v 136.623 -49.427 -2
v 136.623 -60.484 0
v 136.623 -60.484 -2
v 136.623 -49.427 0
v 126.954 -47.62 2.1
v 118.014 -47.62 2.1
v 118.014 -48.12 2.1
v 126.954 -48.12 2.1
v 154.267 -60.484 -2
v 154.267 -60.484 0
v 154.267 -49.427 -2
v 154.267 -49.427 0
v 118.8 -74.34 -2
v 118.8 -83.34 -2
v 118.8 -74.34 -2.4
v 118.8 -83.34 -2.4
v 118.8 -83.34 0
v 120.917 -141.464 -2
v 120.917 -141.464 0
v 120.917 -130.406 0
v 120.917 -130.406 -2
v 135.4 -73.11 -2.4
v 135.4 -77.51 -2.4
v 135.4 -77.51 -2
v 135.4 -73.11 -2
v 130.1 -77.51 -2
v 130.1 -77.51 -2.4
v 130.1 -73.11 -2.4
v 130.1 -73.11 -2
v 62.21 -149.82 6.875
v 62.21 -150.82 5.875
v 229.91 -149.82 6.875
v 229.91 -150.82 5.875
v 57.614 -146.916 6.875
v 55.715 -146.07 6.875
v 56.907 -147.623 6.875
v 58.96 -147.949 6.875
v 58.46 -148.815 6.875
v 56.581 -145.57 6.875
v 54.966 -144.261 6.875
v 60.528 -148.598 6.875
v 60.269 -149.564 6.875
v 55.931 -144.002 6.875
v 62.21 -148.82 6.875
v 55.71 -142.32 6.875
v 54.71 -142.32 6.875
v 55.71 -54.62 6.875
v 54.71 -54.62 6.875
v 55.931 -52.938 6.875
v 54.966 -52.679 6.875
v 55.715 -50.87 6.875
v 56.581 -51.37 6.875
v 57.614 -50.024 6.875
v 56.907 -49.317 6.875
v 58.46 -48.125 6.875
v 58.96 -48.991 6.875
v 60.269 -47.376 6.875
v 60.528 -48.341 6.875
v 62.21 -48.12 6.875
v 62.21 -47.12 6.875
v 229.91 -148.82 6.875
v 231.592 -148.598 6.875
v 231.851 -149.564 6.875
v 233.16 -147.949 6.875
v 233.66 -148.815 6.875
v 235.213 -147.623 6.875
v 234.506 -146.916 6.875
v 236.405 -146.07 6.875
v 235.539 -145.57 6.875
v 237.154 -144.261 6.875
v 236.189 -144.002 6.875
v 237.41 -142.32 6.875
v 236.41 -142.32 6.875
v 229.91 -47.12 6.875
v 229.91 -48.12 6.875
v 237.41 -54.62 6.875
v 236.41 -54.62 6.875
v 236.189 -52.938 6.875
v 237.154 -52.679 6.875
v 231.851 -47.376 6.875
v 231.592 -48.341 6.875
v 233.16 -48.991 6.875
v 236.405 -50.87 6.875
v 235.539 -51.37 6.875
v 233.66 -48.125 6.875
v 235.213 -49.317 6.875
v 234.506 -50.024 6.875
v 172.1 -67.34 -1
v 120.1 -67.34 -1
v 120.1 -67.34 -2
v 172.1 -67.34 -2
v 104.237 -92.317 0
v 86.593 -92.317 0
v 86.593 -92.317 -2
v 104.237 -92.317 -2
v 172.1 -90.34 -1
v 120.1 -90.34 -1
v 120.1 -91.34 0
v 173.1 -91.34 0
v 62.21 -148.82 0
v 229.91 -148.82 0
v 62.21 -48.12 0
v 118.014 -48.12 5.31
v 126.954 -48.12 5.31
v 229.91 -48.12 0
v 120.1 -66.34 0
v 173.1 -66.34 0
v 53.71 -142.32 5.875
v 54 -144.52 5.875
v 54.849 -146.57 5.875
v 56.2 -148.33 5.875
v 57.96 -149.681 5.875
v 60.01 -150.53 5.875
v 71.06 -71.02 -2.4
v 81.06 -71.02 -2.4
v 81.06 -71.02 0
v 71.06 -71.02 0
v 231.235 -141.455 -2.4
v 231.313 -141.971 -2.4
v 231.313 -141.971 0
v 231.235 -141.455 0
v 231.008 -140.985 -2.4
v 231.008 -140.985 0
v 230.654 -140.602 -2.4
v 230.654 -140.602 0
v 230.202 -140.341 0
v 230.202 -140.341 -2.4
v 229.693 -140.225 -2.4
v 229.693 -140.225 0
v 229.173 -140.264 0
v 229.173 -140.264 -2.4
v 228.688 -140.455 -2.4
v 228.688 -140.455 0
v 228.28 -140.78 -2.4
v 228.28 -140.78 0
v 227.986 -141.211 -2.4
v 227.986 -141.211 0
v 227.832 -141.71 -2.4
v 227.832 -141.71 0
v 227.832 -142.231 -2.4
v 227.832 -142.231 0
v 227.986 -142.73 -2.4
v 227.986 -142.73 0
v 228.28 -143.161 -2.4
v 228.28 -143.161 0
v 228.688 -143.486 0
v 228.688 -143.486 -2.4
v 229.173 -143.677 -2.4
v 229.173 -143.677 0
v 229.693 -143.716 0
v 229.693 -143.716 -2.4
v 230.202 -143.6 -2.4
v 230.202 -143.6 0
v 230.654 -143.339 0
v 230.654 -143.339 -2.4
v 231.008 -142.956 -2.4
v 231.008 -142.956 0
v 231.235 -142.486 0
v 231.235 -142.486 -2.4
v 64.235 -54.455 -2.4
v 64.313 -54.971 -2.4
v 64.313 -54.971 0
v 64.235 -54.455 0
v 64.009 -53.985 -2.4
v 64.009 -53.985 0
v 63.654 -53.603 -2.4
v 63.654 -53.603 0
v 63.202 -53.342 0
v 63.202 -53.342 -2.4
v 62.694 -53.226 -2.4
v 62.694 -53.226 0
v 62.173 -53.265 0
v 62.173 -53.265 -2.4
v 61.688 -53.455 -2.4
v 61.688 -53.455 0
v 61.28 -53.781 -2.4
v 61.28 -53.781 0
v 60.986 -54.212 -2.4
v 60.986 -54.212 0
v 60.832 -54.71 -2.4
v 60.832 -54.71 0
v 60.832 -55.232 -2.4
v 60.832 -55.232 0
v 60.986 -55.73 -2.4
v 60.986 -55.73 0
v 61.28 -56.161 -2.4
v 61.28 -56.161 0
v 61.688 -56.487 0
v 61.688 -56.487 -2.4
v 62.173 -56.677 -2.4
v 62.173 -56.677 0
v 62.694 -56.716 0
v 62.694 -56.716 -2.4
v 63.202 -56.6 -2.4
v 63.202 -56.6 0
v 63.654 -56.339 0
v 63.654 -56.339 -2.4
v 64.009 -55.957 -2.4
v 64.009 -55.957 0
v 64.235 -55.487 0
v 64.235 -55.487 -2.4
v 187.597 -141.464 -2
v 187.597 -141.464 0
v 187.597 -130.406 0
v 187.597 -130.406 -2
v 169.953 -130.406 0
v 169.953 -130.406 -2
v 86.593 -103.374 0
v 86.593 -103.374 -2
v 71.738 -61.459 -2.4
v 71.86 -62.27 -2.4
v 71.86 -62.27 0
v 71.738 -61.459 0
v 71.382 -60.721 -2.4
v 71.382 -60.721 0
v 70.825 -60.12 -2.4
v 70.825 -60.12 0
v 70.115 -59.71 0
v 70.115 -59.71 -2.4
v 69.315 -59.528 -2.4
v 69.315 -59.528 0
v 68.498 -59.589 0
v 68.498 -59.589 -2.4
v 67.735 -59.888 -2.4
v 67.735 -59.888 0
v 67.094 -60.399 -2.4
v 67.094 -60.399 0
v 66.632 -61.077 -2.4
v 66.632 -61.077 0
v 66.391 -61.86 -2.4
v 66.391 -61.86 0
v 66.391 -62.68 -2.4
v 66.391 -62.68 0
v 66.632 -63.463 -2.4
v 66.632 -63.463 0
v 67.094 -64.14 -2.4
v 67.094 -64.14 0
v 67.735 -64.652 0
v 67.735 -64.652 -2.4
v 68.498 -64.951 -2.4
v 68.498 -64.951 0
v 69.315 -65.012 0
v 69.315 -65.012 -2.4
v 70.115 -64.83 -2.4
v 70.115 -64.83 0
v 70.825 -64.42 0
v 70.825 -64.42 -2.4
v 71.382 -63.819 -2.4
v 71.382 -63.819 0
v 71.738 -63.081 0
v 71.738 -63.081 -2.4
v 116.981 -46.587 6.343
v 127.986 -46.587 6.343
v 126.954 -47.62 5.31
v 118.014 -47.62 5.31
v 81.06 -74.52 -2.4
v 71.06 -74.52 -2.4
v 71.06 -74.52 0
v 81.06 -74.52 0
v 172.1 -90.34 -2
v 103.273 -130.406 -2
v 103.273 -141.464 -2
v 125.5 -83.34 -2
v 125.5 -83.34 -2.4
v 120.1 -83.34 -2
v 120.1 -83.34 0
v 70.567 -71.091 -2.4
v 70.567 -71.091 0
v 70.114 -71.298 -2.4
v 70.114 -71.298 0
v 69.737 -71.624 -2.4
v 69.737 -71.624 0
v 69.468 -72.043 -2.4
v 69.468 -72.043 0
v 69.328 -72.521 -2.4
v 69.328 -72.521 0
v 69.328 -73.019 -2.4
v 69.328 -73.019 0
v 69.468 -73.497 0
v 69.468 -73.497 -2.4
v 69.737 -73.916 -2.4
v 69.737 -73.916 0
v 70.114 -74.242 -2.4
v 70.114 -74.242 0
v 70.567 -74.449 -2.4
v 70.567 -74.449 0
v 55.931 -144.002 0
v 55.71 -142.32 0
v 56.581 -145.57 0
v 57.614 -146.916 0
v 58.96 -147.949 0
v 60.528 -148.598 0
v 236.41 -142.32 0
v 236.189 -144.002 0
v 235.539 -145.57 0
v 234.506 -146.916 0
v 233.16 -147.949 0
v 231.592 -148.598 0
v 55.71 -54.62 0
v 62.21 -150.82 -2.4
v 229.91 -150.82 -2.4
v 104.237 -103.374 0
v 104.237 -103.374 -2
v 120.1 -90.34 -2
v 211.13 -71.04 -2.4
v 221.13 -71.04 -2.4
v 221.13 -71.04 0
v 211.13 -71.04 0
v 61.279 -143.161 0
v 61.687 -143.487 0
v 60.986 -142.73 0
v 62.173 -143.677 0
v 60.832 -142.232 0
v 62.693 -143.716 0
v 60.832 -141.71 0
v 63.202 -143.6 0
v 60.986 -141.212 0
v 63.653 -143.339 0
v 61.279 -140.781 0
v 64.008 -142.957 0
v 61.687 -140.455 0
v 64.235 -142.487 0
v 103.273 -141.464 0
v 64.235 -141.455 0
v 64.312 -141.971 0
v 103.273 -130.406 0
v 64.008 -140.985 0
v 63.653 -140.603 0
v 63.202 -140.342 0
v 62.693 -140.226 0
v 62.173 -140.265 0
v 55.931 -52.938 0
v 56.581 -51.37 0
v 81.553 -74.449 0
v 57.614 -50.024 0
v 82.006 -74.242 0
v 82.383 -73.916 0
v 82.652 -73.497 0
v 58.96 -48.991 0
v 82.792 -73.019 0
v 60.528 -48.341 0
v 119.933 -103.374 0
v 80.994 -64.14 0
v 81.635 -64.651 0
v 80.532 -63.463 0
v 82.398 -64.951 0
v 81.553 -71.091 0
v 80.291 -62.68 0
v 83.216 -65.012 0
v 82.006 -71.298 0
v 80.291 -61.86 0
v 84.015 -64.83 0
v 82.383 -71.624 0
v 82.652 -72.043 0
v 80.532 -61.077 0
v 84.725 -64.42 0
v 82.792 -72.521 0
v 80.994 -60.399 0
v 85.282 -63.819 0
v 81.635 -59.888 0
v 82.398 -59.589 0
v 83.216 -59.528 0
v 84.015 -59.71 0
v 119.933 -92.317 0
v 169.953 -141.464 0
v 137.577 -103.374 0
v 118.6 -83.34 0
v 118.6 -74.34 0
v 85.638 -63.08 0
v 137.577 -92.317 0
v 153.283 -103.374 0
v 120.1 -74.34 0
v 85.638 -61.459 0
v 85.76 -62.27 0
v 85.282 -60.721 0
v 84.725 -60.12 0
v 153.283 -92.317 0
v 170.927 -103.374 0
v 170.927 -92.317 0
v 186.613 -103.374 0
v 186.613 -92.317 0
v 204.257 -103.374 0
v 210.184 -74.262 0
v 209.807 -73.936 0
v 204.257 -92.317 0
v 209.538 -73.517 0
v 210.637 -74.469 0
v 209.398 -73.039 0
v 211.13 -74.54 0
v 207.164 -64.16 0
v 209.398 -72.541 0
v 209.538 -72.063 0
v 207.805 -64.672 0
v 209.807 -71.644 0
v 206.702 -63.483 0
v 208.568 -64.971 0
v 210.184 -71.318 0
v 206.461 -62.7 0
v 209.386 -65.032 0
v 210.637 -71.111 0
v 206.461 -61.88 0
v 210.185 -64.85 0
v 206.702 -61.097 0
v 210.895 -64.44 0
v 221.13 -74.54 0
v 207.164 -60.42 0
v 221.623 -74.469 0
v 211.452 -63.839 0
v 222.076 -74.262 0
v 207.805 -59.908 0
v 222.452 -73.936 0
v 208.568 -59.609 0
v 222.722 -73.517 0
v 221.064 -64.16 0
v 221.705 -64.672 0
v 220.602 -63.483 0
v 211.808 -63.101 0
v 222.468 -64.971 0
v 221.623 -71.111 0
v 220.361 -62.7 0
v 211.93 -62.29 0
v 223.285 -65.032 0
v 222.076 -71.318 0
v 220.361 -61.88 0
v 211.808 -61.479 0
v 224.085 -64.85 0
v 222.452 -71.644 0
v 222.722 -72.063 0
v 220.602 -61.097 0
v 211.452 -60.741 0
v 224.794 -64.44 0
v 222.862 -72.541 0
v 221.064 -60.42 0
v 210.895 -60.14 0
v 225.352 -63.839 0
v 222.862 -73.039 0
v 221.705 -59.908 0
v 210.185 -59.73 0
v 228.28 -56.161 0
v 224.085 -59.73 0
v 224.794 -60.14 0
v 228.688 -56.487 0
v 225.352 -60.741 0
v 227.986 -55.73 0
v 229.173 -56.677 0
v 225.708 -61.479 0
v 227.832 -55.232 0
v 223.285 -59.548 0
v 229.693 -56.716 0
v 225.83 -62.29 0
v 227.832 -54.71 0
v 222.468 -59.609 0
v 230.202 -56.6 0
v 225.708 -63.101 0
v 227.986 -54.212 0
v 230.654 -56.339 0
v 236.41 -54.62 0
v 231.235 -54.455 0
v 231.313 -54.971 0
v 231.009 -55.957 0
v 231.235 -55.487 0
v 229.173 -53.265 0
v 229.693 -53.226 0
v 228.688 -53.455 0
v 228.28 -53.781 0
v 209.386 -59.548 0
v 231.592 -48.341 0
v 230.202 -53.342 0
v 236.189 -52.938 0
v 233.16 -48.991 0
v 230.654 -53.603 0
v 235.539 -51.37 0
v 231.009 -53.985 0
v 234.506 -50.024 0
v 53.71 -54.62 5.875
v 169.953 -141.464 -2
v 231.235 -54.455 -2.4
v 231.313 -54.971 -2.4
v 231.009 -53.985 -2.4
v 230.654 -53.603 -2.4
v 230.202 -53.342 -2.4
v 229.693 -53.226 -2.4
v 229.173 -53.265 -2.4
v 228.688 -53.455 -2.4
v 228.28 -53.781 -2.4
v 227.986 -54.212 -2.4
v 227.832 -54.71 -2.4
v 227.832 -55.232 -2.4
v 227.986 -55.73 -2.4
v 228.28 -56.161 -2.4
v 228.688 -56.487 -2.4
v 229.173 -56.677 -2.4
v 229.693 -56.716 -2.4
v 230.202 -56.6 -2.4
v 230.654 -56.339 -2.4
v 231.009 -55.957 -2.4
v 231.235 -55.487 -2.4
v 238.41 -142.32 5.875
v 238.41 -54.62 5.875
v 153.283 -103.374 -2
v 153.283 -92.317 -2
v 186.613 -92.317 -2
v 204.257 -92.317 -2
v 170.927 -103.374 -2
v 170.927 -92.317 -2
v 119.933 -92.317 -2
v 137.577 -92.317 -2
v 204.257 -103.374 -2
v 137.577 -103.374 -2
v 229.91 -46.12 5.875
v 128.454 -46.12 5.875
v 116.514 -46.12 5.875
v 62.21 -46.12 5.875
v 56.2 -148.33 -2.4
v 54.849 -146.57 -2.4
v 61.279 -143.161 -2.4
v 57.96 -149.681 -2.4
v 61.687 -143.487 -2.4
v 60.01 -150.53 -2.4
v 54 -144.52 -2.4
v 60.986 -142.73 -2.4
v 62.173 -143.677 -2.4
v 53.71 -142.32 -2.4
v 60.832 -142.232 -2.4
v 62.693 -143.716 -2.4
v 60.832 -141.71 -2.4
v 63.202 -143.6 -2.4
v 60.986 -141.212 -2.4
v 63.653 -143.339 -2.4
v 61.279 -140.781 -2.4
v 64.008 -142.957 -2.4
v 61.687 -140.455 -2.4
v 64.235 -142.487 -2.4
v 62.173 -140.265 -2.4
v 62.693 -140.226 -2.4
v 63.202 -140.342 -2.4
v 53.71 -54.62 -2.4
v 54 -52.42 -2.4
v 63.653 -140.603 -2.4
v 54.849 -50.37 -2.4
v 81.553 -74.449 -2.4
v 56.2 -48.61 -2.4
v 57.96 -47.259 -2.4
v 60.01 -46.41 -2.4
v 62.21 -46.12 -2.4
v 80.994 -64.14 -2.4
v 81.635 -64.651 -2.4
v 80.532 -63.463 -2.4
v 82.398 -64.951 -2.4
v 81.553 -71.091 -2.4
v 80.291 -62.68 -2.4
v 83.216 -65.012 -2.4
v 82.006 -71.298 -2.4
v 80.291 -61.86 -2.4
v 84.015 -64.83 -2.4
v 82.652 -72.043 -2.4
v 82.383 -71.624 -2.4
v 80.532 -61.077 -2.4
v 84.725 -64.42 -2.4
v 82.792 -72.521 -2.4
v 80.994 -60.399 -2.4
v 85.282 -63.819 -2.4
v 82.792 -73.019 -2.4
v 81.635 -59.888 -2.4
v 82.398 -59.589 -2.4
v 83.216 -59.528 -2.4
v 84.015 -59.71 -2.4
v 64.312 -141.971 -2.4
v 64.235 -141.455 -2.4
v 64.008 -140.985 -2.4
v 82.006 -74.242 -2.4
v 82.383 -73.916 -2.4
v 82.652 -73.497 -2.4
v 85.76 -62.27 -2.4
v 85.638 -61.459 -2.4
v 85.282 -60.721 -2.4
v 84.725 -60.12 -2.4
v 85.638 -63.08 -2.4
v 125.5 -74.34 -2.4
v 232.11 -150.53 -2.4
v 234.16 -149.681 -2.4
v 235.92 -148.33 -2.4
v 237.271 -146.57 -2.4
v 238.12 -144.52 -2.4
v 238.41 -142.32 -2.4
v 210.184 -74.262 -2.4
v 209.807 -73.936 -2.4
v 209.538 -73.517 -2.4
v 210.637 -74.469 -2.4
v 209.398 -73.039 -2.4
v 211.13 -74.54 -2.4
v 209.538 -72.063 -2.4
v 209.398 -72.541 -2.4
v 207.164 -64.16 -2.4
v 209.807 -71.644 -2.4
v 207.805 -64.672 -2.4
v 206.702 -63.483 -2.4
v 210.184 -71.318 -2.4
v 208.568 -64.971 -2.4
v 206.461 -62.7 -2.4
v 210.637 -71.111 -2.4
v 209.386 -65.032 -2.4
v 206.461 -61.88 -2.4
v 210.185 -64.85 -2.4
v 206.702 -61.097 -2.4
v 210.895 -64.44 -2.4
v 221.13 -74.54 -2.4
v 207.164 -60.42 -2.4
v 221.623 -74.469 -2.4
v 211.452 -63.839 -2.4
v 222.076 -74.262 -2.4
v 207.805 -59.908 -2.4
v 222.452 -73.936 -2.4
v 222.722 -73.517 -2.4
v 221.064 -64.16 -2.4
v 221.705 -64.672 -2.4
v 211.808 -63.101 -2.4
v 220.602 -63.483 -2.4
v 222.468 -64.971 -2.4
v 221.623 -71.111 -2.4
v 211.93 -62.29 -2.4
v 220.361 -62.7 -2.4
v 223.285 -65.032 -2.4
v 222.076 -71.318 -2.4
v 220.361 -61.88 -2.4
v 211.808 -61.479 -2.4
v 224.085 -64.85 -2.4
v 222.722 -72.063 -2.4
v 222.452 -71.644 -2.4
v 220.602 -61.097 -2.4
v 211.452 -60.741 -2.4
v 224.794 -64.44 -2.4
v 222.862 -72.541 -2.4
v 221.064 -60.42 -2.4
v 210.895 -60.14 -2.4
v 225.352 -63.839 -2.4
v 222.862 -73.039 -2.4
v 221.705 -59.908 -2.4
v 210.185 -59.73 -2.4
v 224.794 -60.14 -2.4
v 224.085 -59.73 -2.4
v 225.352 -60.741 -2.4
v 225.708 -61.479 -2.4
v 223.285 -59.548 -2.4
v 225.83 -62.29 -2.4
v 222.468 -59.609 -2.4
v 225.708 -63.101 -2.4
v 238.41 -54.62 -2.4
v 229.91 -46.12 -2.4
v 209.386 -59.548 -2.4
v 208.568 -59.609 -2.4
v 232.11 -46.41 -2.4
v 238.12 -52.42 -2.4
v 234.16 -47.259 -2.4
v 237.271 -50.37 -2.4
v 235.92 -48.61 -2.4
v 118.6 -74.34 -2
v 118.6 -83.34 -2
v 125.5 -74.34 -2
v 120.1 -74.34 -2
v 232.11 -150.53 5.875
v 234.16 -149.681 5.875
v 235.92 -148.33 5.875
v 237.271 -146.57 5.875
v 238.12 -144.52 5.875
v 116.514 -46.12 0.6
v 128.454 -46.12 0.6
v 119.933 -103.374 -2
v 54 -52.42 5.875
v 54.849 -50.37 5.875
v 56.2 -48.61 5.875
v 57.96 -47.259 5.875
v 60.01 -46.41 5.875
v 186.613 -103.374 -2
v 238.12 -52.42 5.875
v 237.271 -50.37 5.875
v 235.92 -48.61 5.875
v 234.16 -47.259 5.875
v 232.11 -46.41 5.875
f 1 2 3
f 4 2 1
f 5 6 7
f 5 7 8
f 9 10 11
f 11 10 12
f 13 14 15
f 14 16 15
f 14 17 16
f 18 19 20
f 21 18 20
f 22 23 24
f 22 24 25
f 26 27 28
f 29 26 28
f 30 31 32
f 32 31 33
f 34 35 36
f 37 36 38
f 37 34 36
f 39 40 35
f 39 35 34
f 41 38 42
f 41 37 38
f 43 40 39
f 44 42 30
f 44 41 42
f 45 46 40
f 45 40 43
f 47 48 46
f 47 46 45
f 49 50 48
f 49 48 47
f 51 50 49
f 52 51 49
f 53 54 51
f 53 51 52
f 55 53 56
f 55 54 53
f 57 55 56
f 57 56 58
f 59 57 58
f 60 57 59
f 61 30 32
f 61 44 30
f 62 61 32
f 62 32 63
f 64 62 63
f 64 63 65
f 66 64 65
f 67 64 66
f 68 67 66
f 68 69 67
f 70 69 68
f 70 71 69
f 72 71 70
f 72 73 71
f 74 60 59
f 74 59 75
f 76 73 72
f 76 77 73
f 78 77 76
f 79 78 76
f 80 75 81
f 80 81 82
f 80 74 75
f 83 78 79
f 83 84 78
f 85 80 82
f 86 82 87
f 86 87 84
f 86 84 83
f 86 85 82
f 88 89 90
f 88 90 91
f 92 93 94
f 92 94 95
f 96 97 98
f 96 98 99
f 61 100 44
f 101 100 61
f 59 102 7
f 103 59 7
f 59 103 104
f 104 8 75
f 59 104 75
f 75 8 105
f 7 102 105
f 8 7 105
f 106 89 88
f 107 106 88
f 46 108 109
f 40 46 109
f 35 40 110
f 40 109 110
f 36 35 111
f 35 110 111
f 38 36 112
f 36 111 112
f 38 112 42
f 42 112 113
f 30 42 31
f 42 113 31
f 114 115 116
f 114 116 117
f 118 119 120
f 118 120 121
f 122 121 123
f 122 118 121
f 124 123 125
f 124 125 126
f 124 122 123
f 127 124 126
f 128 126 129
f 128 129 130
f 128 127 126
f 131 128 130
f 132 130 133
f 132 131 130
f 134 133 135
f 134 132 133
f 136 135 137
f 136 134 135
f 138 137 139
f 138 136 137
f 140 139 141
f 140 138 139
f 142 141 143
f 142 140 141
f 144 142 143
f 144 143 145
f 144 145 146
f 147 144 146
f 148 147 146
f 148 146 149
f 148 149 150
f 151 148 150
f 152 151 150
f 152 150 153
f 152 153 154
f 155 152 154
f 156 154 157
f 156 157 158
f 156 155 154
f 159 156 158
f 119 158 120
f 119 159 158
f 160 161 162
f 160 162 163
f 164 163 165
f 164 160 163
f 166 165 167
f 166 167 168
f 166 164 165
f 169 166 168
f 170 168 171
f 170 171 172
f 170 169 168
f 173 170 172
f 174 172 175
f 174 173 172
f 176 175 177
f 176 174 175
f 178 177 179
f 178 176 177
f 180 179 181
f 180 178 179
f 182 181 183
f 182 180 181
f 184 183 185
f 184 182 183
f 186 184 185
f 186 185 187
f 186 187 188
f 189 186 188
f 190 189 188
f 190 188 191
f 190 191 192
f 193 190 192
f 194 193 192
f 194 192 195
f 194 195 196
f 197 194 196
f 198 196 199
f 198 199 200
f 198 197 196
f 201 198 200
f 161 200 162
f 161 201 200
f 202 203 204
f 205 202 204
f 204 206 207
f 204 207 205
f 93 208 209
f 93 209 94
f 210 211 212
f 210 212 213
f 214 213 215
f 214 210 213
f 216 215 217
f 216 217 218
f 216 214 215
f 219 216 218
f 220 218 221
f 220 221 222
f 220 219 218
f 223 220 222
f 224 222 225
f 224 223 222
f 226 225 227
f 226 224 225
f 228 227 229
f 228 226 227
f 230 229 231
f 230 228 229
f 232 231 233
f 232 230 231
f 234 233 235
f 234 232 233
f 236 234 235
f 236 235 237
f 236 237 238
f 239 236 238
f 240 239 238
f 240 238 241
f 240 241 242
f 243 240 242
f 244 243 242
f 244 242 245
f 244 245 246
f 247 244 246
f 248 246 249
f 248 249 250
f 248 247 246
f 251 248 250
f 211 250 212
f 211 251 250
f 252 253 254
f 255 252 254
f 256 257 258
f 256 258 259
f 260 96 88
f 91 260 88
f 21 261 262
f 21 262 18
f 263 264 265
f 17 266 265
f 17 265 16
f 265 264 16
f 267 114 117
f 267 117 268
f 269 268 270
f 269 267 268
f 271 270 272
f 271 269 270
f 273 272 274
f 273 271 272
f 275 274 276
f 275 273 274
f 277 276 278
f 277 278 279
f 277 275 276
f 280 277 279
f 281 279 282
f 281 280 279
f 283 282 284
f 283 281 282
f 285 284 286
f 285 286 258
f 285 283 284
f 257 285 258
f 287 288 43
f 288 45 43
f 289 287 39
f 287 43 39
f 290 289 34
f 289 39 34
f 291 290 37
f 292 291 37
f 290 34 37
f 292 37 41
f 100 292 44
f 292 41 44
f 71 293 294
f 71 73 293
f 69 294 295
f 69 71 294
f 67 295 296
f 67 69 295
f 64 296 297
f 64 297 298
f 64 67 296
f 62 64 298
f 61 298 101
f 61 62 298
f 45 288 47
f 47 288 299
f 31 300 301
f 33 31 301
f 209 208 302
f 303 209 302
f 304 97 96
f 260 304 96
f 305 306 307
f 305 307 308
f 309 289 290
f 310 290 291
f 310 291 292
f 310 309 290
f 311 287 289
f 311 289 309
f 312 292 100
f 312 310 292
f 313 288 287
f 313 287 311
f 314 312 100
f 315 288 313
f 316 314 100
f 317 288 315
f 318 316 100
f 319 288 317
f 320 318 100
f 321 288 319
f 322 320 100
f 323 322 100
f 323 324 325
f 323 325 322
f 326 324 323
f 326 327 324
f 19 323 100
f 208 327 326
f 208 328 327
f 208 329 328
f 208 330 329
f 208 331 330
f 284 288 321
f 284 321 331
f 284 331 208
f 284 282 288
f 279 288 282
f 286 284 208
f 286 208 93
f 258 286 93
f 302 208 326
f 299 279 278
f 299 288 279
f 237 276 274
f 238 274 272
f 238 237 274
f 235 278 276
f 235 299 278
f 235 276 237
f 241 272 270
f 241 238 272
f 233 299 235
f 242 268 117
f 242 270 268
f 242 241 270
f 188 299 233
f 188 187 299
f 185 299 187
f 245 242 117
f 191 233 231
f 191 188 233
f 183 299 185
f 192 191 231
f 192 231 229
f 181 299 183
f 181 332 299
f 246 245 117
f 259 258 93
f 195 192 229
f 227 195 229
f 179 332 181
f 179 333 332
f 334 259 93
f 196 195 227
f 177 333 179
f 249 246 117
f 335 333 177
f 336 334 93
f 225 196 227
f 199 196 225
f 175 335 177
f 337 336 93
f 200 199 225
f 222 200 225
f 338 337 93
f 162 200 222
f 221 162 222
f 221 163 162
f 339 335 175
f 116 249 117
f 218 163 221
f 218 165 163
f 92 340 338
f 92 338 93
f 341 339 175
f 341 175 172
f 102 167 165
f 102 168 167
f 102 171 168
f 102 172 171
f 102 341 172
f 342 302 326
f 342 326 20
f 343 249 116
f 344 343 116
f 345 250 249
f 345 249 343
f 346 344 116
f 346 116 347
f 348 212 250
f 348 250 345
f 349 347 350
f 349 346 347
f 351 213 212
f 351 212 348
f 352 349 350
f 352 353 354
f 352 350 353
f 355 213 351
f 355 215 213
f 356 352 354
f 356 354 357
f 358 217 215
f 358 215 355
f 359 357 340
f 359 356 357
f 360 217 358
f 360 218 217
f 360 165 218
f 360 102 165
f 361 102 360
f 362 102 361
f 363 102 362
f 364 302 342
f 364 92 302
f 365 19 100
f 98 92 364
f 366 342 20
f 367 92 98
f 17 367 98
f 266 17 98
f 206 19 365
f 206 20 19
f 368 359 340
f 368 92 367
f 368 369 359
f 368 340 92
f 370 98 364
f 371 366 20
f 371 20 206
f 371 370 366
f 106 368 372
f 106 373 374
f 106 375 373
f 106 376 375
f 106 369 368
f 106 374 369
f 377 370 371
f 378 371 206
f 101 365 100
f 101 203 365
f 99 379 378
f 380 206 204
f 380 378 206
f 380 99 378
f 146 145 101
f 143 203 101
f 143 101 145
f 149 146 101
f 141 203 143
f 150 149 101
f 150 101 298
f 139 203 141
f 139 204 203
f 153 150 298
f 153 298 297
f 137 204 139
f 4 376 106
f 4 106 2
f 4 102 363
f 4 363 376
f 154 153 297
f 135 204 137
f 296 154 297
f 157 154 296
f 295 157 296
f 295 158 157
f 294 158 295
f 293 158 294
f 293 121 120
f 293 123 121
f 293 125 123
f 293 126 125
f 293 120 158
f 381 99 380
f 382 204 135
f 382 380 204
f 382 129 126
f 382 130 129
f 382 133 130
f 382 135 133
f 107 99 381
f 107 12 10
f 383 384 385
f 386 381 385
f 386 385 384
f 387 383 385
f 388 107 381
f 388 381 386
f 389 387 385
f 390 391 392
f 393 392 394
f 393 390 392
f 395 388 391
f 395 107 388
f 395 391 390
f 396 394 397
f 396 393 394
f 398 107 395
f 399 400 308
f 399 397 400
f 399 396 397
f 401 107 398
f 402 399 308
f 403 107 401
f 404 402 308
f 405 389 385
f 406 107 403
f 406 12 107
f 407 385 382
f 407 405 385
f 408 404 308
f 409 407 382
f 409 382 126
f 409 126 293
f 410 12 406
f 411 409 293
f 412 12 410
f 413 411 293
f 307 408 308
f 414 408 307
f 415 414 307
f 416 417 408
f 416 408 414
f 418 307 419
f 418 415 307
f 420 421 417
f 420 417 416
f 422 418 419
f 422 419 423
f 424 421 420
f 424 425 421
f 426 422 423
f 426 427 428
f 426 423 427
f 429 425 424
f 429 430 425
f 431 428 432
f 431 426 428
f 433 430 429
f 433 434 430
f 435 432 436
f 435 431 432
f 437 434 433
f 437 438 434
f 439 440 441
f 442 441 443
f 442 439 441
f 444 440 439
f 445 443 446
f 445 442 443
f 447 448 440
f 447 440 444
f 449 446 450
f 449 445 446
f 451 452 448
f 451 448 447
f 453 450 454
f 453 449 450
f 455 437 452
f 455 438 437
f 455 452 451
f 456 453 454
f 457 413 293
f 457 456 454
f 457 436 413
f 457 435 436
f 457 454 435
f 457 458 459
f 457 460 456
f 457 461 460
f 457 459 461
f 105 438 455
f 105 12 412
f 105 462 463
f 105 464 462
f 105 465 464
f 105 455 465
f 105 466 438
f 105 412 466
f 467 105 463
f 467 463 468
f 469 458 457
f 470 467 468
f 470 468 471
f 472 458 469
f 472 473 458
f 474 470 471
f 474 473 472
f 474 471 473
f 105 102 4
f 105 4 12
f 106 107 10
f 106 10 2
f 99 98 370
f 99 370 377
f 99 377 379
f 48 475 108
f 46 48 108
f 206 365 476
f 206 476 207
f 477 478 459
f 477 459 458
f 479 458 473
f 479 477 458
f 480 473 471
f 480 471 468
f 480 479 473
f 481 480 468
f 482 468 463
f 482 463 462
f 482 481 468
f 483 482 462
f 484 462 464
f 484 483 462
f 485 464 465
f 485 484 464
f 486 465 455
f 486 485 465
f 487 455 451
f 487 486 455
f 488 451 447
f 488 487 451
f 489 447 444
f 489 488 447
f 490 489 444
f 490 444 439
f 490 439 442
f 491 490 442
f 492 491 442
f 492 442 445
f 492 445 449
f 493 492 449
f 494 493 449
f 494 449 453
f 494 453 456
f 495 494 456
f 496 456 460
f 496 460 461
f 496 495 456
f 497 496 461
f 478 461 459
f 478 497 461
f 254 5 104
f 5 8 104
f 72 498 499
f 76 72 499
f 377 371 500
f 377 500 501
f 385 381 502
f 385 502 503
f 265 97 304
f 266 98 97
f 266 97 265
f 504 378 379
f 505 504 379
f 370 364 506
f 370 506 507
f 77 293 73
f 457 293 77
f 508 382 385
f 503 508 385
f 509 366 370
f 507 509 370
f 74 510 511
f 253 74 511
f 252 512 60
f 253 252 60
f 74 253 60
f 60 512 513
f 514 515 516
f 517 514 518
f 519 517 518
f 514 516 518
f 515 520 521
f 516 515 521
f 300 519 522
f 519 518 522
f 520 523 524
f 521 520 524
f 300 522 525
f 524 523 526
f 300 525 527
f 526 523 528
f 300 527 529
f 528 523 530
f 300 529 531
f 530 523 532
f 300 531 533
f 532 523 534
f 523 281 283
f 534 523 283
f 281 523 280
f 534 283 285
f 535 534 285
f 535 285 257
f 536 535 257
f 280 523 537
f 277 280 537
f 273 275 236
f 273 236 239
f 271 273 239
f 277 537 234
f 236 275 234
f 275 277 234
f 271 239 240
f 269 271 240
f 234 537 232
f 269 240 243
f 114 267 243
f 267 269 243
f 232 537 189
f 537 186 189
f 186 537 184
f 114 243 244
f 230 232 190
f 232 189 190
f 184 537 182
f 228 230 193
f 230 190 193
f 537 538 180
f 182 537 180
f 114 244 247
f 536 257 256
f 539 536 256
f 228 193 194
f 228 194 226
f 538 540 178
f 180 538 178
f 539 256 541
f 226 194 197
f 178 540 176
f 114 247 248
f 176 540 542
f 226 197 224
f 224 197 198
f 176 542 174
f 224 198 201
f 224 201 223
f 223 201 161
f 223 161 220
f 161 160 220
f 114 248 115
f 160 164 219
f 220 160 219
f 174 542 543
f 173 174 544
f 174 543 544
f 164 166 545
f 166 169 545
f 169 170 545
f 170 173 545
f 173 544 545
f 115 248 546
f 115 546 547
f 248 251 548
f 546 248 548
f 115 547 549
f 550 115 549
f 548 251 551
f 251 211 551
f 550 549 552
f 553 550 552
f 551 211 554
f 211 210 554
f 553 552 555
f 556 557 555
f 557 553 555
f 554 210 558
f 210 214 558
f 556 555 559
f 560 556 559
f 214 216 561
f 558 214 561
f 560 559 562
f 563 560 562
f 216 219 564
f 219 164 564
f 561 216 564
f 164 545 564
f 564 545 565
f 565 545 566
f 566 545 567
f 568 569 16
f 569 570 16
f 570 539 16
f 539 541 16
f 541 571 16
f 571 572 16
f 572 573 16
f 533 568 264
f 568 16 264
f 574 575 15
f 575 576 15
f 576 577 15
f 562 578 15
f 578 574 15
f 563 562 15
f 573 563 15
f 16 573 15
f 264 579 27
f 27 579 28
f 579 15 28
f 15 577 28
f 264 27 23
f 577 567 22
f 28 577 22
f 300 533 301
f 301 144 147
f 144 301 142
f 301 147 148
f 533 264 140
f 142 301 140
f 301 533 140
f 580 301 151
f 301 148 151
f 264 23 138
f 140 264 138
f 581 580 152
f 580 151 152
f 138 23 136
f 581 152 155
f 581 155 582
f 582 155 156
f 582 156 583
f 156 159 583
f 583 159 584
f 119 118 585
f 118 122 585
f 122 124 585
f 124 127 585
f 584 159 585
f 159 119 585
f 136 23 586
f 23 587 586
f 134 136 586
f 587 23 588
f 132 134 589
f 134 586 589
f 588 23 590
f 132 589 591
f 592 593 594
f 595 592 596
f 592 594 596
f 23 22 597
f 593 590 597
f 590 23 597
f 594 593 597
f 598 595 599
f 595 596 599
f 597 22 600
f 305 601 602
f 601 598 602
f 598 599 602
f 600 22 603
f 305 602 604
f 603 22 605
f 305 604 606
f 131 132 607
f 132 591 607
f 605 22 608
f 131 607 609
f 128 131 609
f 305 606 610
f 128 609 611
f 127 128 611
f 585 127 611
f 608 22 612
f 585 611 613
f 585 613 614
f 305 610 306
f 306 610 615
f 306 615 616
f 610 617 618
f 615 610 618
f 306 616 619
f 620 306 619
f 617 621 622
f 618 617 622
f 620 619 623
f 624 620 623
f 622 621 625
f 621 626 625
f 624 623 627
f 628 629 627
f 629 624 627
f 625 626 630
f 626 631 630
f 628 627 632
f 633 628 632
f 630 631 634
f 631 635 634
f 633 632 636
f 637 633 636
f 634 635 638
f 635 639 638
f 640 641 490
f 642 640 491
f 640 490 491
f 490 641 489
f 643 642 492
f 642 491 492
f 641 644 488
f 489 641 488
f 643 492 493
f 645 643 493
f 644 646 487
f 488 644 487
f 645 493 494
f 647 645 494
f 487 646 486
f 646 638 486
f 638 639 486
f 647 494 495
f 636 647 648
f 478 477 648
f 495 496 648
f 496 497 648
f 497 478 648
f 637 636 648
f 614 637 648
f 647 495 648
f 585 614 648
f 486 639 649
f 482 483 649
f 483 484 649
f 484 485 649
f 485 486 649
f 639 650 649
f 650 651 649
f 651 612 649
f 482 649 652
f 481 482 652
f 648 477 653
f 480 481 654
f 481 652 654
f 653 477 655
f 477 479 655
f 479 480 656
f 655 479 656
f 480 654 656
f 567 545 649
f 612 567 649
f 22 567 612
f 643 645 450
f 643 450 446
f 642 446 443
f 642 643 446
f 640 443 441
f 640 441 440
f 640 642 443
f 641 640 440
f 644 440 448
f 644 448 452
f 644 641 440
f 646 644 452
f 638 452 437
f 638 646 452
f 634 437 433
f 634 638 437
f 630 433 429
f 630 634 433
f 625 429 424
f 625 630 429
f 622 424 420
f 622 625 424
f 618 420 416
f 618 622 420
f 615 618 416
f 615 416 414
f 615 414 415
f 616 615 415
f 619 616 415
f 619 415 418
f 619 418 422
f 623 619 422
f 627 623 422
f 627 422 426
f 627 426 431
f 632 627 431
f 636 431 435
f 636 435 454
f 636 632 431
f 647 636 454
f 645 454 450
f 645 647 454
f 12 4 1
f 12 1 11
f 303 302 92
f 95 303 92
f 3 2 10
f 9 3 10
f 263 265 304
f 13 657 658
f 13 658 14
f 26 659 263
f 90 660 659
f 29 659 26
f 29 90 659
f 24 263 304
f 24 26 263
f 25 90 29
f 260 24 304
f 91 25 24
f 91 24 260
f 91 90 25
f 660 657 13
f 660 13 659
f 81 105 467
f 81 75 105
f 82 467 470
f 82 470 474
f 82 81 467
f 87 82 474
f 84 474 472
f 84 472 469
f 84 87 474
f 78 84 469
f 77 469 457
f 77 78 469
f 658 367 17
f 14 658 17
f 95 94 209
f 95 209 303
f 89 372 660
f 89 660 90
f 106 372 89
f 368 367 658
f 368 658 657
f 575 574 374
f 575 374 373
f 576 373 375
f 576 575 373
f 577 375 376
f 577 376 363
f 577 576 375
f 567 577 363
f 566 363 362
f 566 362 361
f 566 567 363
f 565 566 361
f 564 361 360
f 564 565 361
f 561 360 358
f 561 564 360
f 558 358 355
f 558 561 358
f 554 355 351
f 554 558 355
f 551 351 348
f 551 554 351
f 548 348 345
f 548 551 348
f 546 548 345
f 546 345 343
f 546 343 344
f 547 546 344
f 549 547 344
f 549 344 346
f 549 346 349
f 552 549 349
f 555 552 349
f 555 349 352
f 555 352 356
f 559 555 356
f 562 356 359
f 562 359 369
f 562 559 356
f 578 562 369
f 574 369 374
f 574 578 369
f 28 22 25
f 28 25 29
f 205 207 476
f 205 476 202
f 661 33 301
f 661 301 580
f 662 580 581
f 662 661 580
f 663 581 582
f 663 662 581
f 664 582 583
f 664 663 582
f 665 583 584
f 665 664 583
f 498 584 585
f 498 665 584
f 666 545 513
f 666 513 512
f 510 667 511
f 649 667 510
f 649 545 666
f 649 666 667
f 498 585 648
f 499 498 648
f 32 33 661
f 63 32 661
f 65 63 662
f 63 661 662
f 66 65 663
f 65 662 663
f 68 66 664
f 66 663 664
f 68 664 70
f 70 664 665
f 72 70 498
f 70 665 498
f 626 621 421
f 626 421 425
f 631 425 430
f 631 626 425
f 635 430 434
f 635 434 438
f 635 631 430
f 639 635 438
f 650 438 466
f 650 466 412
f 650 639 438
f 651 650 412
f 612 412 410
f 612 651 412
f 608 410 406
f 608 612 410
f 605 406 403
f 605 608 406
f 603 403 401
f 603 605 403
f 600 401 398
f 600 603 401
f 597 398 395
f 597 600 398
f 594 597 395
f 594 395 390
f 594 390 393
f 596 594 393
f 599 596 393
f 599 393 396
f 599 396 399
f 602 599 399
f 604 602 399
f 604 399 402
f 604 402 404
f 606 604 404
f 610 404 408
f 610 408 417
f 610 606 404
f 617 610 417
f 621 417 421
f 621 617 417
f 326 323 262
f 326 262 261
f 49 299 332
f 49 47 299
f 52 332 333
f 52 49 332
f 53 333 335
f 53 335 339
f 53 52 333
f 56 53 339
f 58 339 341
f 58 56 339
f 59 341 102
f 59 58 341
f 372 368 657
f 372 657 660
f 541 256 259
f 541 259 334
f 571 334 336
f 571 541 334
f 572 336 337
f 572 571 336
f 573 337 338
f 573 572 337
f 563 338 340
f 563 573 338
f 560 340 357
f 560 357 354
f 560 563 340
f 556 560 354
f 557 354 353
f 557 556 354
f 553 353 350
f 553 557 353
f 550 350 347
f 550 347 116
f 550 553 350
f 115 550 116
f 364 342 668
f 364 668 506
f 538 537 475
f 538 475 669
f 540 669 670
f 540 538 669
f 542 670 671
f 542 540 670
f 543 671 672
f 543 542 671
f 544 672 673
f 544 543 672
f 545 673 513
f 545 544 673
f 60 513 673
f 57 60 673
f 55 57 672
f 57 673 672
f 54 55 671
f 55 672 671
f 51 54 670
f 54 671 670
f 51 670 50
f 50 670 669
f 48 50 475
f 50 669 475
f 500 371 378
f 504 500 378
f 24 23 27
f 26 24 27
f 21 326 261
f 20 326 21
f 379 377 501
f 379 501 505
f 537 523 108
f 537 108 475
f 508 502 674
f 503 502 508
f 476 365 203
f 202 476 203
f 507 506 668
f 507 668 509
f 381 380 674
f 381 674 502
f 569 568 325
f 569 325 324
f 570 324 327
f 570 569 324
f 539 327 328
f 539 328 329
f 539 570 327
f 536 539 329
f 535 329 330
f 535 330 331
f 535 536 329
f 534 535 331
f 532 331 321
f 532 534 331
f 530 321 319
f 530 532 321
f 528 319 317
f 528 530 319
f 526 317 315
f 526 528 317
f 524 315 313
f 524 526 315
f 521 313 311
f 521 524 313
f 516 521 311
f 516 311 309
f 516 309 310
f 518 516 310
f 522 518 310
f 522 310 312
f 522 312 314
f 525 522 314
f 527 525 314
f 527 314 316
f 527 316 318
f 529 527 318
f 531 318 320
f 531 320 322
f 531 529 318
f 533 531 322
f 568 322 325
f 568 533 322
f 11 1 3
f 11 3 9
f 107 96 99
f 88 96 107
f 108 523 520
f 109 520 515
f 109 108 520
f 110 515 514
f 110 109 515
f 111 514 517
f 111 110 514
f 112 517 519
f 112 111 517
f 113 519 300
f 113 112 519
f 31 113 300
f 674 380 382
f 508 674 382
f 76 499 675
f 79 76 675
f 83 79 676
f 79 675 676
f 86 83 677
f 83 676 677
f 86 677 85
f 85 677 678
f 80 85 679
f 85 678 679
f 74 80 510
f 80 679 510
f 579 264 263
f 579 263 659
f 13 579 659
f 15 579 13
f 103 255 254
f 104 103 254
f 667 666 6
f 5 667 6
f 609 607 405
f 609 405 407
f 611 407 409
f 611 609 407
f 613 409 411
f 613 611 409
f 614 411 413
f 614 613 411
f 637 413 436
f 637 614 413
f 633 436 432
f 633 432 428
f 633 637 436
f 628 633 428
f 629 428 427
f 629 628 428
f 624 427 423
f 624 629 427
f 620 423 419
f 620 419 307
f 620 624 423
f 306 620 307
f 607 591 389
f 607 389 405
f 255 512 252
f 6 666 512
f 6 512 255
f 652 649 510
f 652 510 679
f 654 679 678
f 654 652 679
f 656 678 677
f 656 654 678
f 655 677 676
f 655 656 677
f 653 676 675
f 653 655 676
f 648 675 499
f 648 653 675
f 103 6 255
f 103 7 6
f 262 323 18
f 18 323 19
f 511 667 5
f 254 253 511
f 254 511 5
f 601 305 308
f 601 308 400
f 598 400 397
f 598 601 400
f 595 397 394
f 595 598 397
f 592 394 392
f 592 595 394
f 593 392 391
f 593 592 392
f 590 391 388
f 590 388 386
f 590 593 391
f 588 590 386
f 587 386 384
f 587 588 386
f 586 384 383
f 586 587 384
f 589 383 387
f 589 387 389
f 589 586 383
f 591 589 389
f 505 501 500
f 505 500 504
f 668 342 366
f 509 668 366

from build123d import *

# Parameters (mm, degrees)
SKETCH8_W                = 184.700046
SKETCH8_H                = 104.699952
SKETCH8_W_2              = 180.700046
SKETCH8_H_2              = 100.699952
BOSS_EXTRUDE1_DEPTH      = 6.875
BOSS_EXTRUDE2_START      = -2.4
BOSS_EXTRUDE2_OUTLINE_W  = 184.700046
BOSS_EXTRUDE2_OUTLINE_H  = 104.699952
BOSS_EXTRUDE2_DEPTH      = 2.4
FILLET1_R                = 6.5
FILLET2_R                = 8.5
CUT_EXTRUDE1_START       = -2.4
CUT_EXTRUDE1_OUTLINE_R   = 1.75
CUT_EXTRUDE1_OUTLINE_R_2 = 2.75
CUT_EXTRUDE1_DEPTH       = 2.4
SKETCH10_7_W             = 17.644114
SKETCH10_7_H             = 11.057386
SKETCH10_7_W_2           = 17.64386
CUT_EXTRUDE5_DEPTH       = 2
SKETCH10_5_W             = 52
SKETCH10_5_H             = 23
SKETCH10_5_W_2           = 1.5
SKETCH10_5_H_2           = 9
CUT_EXTRUDE2_DEPTH       = 2
SKETCH11_W               = 5.3
SKETCH11_H               = 4.4
SKETCH11_W_2             = 6.7
SKETCH11_H_2             = 9
CUT_EXTRUDE3_DEPTH       = 283.262347682
CUT_EXTRUDE4_REACH       = 262.478
SKETCH13_W               = 8.94
SKETCH13_H               = 3.21
CHAMFER1_SIZE            = 1


# Read off the part's stored shape, not the designer's step: Boss-Extrude2, Cut-Extrude1
with BuildPart() as part:
    # Sketch8 → Boss-Extrude1 (new body)
    with BuildSketch(Plane.XY):
        with Locations((146.060033, -98.469958)):
            Rectangle(SKETCH8_W, SKETCH8_H)
        with Locations((146.060033, -98.469958)):
            Rectangle(SKETCH8_W_2, SKETCH8_H_2, mode=Mode.SUBTRACT)
    extrude(amount=BOSS_EXTRUDE1_DEPTH)

    # Boss-Extrude2 outline → Boss-Extrude2 (add)
    with BuildSketch(Plane.XY.offset(BOSS_EXTRUDE2_START)):
        with Locations((146.060033, -98.469958)):
            Rectangle(BOSS_EXTRUDE2_OUTLINE_W, BOSS_EXTRUDE2_OUTLINE_H)
    extrude(amount=BOSS_EXTRUDE2_DEPTH)

    # Fillet1
    fillet1_edges = [part.edges().sort_by_distance(p)[0] for p in [
        (55.71001, -48.119982, 3.4375),
        (55.71001, -148.819934, 3.4375),
        (236.410056, -148.819934, 3.4375),
        (236.410056, -48.119982, 3.4375),
    ]]
    fillet(fillet1_edges, radius=FILLET1_R)

    # Fillet2
    fillet2_edges = [part.edges().sort_by_distance(p)[0] for p in [
        (53.71001, -46.119982, 2.2375),
        (238.410056, -46.119982, 2.2375),
        (238.410056, -150.819934, 2.2375),
        (53.71001, -150.819934, 2.2375),
    ]]
    fillet(fillet2_edges, radius=FILLET2_R)

    # Cut-Extrude1 outline → Cut-Extrude1 (cut)
    with BuildSketch(Plane.XY.offset(CUT_EXTRUDE1_START)):
        with BuildLine():
            ThreePointArc((211.129890659, -71.039941661), (209.379890659, -72.789941661), (211.129890659, -74.539941661))
            Line((211.129890659, -74.539941661), (221.129869217, -74.539956319))
            ThreePointArc((221.129869217, -74.539956319), (222.879869217, -72.789956319), (221.129869217, -71.039956319))
            Line((221.129869217, -71.039956319), (211.129890659, -71.039941661))
        make_face()
        with BuildLine():
            ThreePointArc((71.060056, -71.020026355), (69.310056, -72.770026355), (71.060056, -74.520026355))
            Line((71.060056, -74.520026355), (81.060031996, -74.520024697))
            ThreePointArc((81.060031996, -74.520024697), (82.810031996, -72.770024697), (81.060031996, -71.020024697))
            Line((81.060031996, -71.020024697), (71.060056, -71.020026355))
        make_face()
        with Locations((62.562867, -54.971021734)):
            Circle(CUT_EXTRUDE1_OUTLINE_R)
        with Locations((62.562261827, -141.970970853)):
            Circle(CUT_EXTRUDE1_OUTLINE_R)
        with Locations((229.562577334, -141.970520822)):
            Circle(CUT_EXTRUDE1_OUTLINE_R)
        with Locations((229.562626116, -54.970974994)):
            Circle(CUT_EXTRUDE1_OUTLINE_R)
        with Locations((69.109971, -62.269943649)):
            Circle(CUT_EXTRUDE1_OUTLINE_R_2)
        with Locations((83.009994, -62.269891837)):
            Circle(CUT_EXTRUDE1_OUTLINE_R_2)
        with Locations((223.079889236, -62.289981332)):
            Circle(CUT_EXTRUDE1_OUTLINE_R_2)
        with Locations((209.180049, -62.290009649)):
            Circle(CUT_EXTRUDE1_OUTLINE_R_2)
    extrude(amount=CUT_EXTRUDE1_DEPTH, mode=Mode.SUBTRACT)

    # Sketch10<7> → Cut-Extrude5 (cut)
    with BuildSketch(Plane.XY):
        with Locations((95.414973, -97.845245)):
            Rectangle(SKETCH10_7_W, SKETCH10_7_H)
        with Locations((128.755013, -97.845245)):
            Rectangle(SKETCH10_7_W, SKETCH10_7_H)
        with Locations((162.104959, -97.845245)):
            Rectangle(SKETCH10_7_W, SKETCH10_7_H)
        with Locations((195.434966, -97.845245)):
            Rectangle(SKETCH10_7_W_2, SKETCH10_7_H)
        with Locations((112.095026, -135.935085)):
            Rectangle(SKETCH10_7_W_2, SKETCH10_7_H)
        with Locations((178.774979, -135.935085)):
            Rectangle(SKETCH10_7_W, SKETCH10_7_H)
        with Locations((145.444972, -54.955313)):
            Rectangle(SKETCH10_7_W_2, SKETCH10_7_H)
    extrude(amount=-CUT_EXTRUDE5_DEPTH, mode=Mode.SUBTRACT)

    # Sketch10<5> → Cut-Extrude2 (cut)
    with BuildSketch(Plane.XY):
        with Locations((146.099911, -78.839949)):
            Rectangle(SKETCH10_5_W, SKETCH10_5_H)
        with Locations((119.349911, -78.839949)):
            Rectangle(SKETCH10_5_W_2, SKETCH10_5_H_2)
    extrude(amount=-CUT_EXTRUDE2_DEPTH, mode=Mode.SUBTRACT)

    # Sketch11 → Cut-Extrude3 (cut, through all)
    with BuildSketch(Plane(origin=(0, 0, -2.4), x_dir=(-1, 0, 0), z_dir=(0, 0, -1))):
        with Locations((-132.750038, -75.310076)):
            Rectangle(SKETCH11_W, SKETCH11_H)
        with Locations((-122.150038, -78.840076)):
            Rectangle(SKETCH11_W_2, SKETCH11_H_2)
    extrude(amount=-CUT_EXTRUDE3_DEPTH, mode=Mode.SUBTRACT)

    # Sketch13 → Cut-Extrude4 (cut, up to next)
    with BuildSketch(Plane(origin=(0, -46.119982, 0), x_dir=(1, 0, 0), z_dir=(0, 1, 0)), mode=Mode.PRIVATE) as cut_extrude4_sk1:
        with Locations((122.48388, -3.705)):
            Rectangle(SKETCH13_W, SKETCH13_H)
    cut_extrude4_tool1 = extrude(cut_extrude4_sk1.sketch, amount=-CUT_EXTRUDE4_REACH, mode=Mode.PRIVATE) & part.part
    add(cut_extrude4_tool1.solids().sort_by_distance((122.48388, -46.119982, 3.705))[0], mode=Mode.SUBTRACT)

    # Chamfer1
    chamfer1_edges = [part.edges().sort_by_distance(p)[0] for p in [
        (146.099911, -90.339949, 0),
        (146.099911, -67.339949, 0),
        (172.099911, -78.839949, 0),
        (238.410056, -98.469958, 6.875),
        (146.060033, -150.819934, 6.875),
        (53.71001, -98.469958, 6.875),
        (146.060033, -46.119982, 6.875),
        (56.19960236, -48.60957436, 6.875),
        (235.92046364, -48.60957436, 6.875),
        (56.19960236, -148.33034164, 6.875),
        (235.92046364, -148.33034164, 6.875),
    ]]
    chamfer(chamfer1_edges, length=CHAMFER1_SIZE)

    # Chamfer2
    # the kernel refuses this chamfer: 1.5 mm, written as the material it takes off along each edge
    with BuildSketch(Plane(origin=(118.01388, -46.119982, 5.31), x_dir=(0, 0.02749587661058678, 0.9996219169112968), z_dir=(1, 0, 0)), Plane(origin=(126.95388, -46.119982, 2.1), x_dir=(0, 0.027495876610586778, -0.9996219169112968), z_dir=(-1, 0, 0))) as chamfer2_piece_1:
        with BuildLine():
            Line((1.543009793, 0), (-0.084820732, 1.54067669))
            Line((-0.084820732, 1.54067669), (-0.11480939, 1.539851814))
            ThreePointArc((-0.11480939, 1.539851814), (-0.051193841, 0.770096744), (-0.029988658, -0.000824876))
            Line((-0.029988658, -0.000824876), (0.000824876, -0.029988658))
            ThreePointArc((0.000824876, -0.029988658), (0.771746497, -0.008783474), (1.543834669, -0.029988658))
            Line((1.543834669, -0.029988658), (1.543009793, 0))
        make_face()
    extrude(amount=8.94, mode=Mode.SUBTRACT)
    with BuildSketch(Plane(origin=(126.95388, -46.119982, 5.31), x_dir=(0.9996219169112968, 0.027495876610586893, 0), z_dir=(0, 0, -1)), Plane(origin=(118.01388, -46.119982, 2.1), x_dir=(-0.9996219169112968, 0.027495876610586893, 0), z_dir=(0, 0, 1))) as chamfer2_piece_2:
        with BuildLine():
            Line((1.543009793, 0), (-0.084820732, 1.54067669))
            Line((-0.084820732, 1.54067669), (-0.11480939, 1.539851814))
            ThreePointArc((-0.11480939, 1.539851814), (-0.051193841, 0.770096744), (-0.029988658, -0.000824876))
            Line((-0.029988658, -0.000824876), (0.000824876, -0.029988658))
            ThreePointArc((0.000824876, -0.029988658), (0.771746497, -0.008783474), (1.543834669, -0.029988658))
            Line((1.543834669, -0.029988658), (1.543009793, 0))
        make_face()
    extrude(amount=3.21, mode=Mode.SUBTRACT)
    with BuildSketch(Plane(origin=(118.01388, -46.119982, 2.1), x_dir=(-0.9996219169112968, 0.027495876610586893, 0), z_dir=(0, 0, 1))) as chamfer2_piece_3a_section:
        with BuildLine():
            Line((1.543009793, 0), (-0.084820732, 1.54067669))
            Line((-0.084820732, 1.54067669), (-0.11480939, 1.539851814))
            ThreePointArc((-0.11480939, 1.539851814), (-0.051193841, 0.770096744), (-0.029988658, -0.000824876))
            Line((-0.029988658, -0.000824876), (0.000824876, -0.029988658))
            ThreePointArc((0.000824876, -0.029988658), (0.771746497, -0.008783474), (1.543834669, -0.029988658))
            Line((1.543834669, -0.029988658), (1.543009793, 0))
        make_face()
    chamfer2_piece_3a = extrude(amount=7.067524482, mode=Mode.PRIVATE)
    chamfer2_piece_3a = split(chamfer2_piece_3a, bisect_by=Plane(origin=(117.51918956, -46.61467244, 5.31), z_dir=(0, 0, 1)), keep=Keep.TOP, mode=Mode.PRIVATE)
    with BuildSketch(Plane(origin=(114.156355518, -46.119982, 5.31), x_dir=(0, 0.02749587661058678, 0.9996219169112968), z_dir=(1, 0, 0))) as chamfer2_piece_3b_section:
        with BuildLine():
            Line((1.543009793, 0), (-0.084820732, 1.54067669))
            Line((-0.084820732, 1.54067669), (-0.11480939, 1.539851814))
            ThreePointArc((-0.11480939, 1.539851814), (-0.051193841, 0.770096744), (-0.029988658, -0.000824876))
            Line((-0.029988658, -0.000824876), (0.000824876, -0.029988658))
            ThreePointArc((0.000824876, -0.029988658), (0.771746497, -0.008783474), (1.543834669, -0.029988658))
            Line((1.543834669, -0.029988658), (1.543009793, 0))
        make_face()
    chamfer2_piece_3b = extrude(amount=12.797524482, mode=Mode.PRIVATE)
    chamfer2_piece_3b = split(chamfer2_piece_3b, bisect_by=Plane(origin=(118.01388, -46.61467244, 5.80469044), z_dir=(-1, 0, 0)), keep=Keep.TOP, mode=Mode.PRIVATE)
    chamfer2_piece_3 = chamfer2_piece_3a & chamfer2_piece_3b
    add(chamfer2_piece_3, mode=Mode.SUBTRACT)
    with BuildSketch(Plane(origin=(126.95388, -46.119982, 9.167524482), x_dir=(0.9996219169112968, 0.027495876610586893, 0), z_dir=(0, 0, -1))) as chamfer2_piece_4a_section:
        with BuildLine():
            Line((1.543009793, 0), (-0.084820732, 1.54067669))
            Line((-0.084820732, 1.54067669), (-0.11480939, 1.539851814))
            ThreePointArc((-0.11480939, 1.539851814), (-0.051193841, 0.770096744), (-0.029988658, -0.000824876))
            Line((-0.029988658, -0.000824876), (0.000824876, -0.029988658))
            ThreePointArc((0.000824876, -0.029988658), (0.771746497, -0.008783474), (1.543834669, -0.029988658))
            Line((1.543834669, -0.029988658), (1.543009793, 0))
        make_face()
    chamfer2_piece_4a = extrude(amount=7.067524482, mode=Mode.PRIVATE)
    chamfer2_piece_4a = split(chamfer2_piece_4a, bisect_by=Plane(origin=(127.44857044, -46.61467244, 5.31), z_dir=(0, 0, 1)), keep=Keep.TOP, mode=Mode.PRIVATE)
    with BuildSketch(Plane(origin=(118.01388, -46.119982, 5.31), x_dir=(0, 0.02749587661058678, 0.9996219169112968), z_dir=(1, 0, 0))) as chamfer2_piece_4b_section:
        with BuildLine():
            Line((1.543009793, 0), (-0.084820732, 1.54067669))
            Line((-0.084820732, 1.54067669), (-0.11480939, 1.539851814))
            ThreePointArc((-0.11480939, 1.539851814), (-0.051193841, 0.770096744), (-0.029988658, -0.000824876))
            Line((-0.029988658, -0.000824876), (0.000824876, -0.029988658))
            ThreePointArc((0.000824876, -0.029988658), (0.771746497, -0.008783474), (1.543834669, -0.029988658))
            Line((1.543834669, -0.029988658), (1.543009793, 0))
        make_face()
    chamfer2_piece_4b = extrude(amount=12.797524482, mode=Mode.PRIVATE)
    chamfer2_piece_4b = split(chamfer2_piece_4b, bisect_by=Plane(origin=(126.95388, -46.61467244, 5.80469044), z_dir=(1, 0, 0)), keep=Keep.TOP, mode=Mode.PRIVATE)
    chamfer2_piece_4 = chamfer2_piece_4a & chamfer2_piece_4b
    add(chamfer2_piece_4, mode=Mode.SUBTRACT)
    with BuildSketch(Plane(origin=(126.95388, -46.119982, 5.31), x_dir=(0.9996219169112968, 0.027495876610586893, 0), z_dir=(0, 0, -1))) as chamfer2_piece_5a_section:
        with BuildLine():
            Line((1.543009793, 0), (-0.084820732, 1.54067669))
            Line((-0.084820732, 1.54067669), (-0.11480939, 1.539851814))
            ThreePointArc((-0.11480939, 1.539851814), (-0.051193841, 0.770096744), (-0.029988658, -0.000824876))
            Line((-0.029988658, -0.000824876), (0.000824876, -0.029988658))
            ThreePointArc((0.000824876, -0.029988658), (0.771746497, -0.008783474), (1.543834669, -0.029988658))
            Line((1.543834669, -0.029988658), (1.543009793, 0))
        make_face()
    chamfer2_piece_5a = extrude(amount=7.067524482, mode=Mode.PRIVATE)
    chamfer2_piece_5a = split(chamfer2_piece_5a, bisect_by=Plane(origin=(127.44857044, -46.61467244, 2.1), z_dir=(0, 0, -1)), keep=Keep.TOP, mode=Mode.PRIVATE)
    with BuildSketch(Plane(origin=(130.811404482, -46.119982, 2.1), x_dir=(0, 0.027495876610586778, -0.9996219169112968), z_dir=(-1, 0, 0))) as chamfer2_piece_5b_section:
        with BuildLine():
            Line((1.543009793, 0), (-0.084820732, 1.54067669))
            Line((-0.084820732, 1.54067669), (-0.11480939, 1.539851814))
            ThreePointArc((-0.11480939, 1.539851814), (-0.051193841, 0.770096744), (-0.029988658, -0.000824876))
            Line((-0.029988658, -0.000824876), (0.000824876, -0.029988658))
            ThreePointArc((0.000824876, -0.029988658), (0.771746497, -0.008783474), (1.543834669, -0.029988658))
            Line((1.543834669, -0.029988658), (1.543009793, 0))
        make_face()
    chamfer2_piece_5b = extrude(amount=12.797524482, mode=Mode.PRIVATE)
    chamfer2_piece_5b = split(chamfer2_piece_5b, bisect_by=Plane(origin=(126.95388, -46.61467244, 1.60530956), z_dir=(1, 0, 0)), keep=Keep.TOP, mode=Mode.PRIVATE)
    chamfer2_piece_5 = chamfer2_piece_5a & chamfer2_piece_5b
    add(chamfer2_piece_5, mode=Mode.SUBTRACT)
    with BuildSketch(Plane(origin=(126.95388, -46.119982, 2.1), x_dir=(0, 0.027495876610586778, -0.9996219169112968), z_dir=(-1, 0, 0))) as chamfer2_piece_6a_section:
        with BuildLine():
            Line((1.543009793, 0), (-0.084820732, 1.54067669))
            Line((-0.084820732, 1.54067669), (-0.11480939, 1.539851814))
            ThreePointArc((-0.11480939, 1.539851814), (-0.051193841, 0.770096744), (-0.029988658, -0.000824876))
            Line((-0.029988658, -0.000824876), (0.000824876, -0.029988658))
            ThreePointArc((0.000824876, -0.029988658), (0.771746497, -0.008783474), (1.543834669, -0.029988658))
            Line((1.543834669, -0.029988658), (1.543009793, 0))
        make_face()
    chamfer2_piece_6a = extrude(amount=12.797524482, mode=Mode.PRIVATE)
    chamfer2_piece_6a = split(chamfer2_piece_6a, bisect_by=Plane(origin=(118.01388, -46.61467244, 1.60530956), z_dir=(-1, 0, 0)), keep=Keep.TOP, mode=Mode.PRIVATE)
    with BuildSketch(Plane(origin=(118.01388, -46.119982, -1.757524482), x_dir=(-0.9996219169112968, 0.027495876610586893, 0), z_dir=(0, 0, 1))) as chamfer2_piece_6b_section:
        with BuildLine():
            Line((1.543009793, 0), (-0.084820732, 1.54067669))
            Line((-0.084820732, 1.54067669), (-0.11480939, 1.539851814))
            ThreePointArc((-0.11480939, 1.539851814), (-0.051193841, 0.770096744), (-0.029988658, -0.000824876))
            Line((-0.029988658, -0.000824876), (0.000824876, -0.029988658))
            ThreePointArc((0.000824876, -0.029988658), (0.771746497, -0.008783474), (1.543834669, -0.029988658))
            Line((1.543834669, -0.029988658), (1.543009793, 0))
        make_face()
    chamfer2_piece_6b = extrude(amount=7.067524482, mode=Mode.PRIVATE)
    chamfer2_piece_6b = split(chamfer2_piece_6b, bisect_by=Plane(origin=(117.51918956, -46.61467244, 2.1), z_dir=(0, 0, -1)), keep=Keep.TOP, mode=Mode.PRIVATE)
    chamfer2_piece_6 = chamfer2_piece_6a & chamfer2_piece_6b
    add(chamfer2_piece_6, mode=Mode.SUBTRACT)


solid = part.part
